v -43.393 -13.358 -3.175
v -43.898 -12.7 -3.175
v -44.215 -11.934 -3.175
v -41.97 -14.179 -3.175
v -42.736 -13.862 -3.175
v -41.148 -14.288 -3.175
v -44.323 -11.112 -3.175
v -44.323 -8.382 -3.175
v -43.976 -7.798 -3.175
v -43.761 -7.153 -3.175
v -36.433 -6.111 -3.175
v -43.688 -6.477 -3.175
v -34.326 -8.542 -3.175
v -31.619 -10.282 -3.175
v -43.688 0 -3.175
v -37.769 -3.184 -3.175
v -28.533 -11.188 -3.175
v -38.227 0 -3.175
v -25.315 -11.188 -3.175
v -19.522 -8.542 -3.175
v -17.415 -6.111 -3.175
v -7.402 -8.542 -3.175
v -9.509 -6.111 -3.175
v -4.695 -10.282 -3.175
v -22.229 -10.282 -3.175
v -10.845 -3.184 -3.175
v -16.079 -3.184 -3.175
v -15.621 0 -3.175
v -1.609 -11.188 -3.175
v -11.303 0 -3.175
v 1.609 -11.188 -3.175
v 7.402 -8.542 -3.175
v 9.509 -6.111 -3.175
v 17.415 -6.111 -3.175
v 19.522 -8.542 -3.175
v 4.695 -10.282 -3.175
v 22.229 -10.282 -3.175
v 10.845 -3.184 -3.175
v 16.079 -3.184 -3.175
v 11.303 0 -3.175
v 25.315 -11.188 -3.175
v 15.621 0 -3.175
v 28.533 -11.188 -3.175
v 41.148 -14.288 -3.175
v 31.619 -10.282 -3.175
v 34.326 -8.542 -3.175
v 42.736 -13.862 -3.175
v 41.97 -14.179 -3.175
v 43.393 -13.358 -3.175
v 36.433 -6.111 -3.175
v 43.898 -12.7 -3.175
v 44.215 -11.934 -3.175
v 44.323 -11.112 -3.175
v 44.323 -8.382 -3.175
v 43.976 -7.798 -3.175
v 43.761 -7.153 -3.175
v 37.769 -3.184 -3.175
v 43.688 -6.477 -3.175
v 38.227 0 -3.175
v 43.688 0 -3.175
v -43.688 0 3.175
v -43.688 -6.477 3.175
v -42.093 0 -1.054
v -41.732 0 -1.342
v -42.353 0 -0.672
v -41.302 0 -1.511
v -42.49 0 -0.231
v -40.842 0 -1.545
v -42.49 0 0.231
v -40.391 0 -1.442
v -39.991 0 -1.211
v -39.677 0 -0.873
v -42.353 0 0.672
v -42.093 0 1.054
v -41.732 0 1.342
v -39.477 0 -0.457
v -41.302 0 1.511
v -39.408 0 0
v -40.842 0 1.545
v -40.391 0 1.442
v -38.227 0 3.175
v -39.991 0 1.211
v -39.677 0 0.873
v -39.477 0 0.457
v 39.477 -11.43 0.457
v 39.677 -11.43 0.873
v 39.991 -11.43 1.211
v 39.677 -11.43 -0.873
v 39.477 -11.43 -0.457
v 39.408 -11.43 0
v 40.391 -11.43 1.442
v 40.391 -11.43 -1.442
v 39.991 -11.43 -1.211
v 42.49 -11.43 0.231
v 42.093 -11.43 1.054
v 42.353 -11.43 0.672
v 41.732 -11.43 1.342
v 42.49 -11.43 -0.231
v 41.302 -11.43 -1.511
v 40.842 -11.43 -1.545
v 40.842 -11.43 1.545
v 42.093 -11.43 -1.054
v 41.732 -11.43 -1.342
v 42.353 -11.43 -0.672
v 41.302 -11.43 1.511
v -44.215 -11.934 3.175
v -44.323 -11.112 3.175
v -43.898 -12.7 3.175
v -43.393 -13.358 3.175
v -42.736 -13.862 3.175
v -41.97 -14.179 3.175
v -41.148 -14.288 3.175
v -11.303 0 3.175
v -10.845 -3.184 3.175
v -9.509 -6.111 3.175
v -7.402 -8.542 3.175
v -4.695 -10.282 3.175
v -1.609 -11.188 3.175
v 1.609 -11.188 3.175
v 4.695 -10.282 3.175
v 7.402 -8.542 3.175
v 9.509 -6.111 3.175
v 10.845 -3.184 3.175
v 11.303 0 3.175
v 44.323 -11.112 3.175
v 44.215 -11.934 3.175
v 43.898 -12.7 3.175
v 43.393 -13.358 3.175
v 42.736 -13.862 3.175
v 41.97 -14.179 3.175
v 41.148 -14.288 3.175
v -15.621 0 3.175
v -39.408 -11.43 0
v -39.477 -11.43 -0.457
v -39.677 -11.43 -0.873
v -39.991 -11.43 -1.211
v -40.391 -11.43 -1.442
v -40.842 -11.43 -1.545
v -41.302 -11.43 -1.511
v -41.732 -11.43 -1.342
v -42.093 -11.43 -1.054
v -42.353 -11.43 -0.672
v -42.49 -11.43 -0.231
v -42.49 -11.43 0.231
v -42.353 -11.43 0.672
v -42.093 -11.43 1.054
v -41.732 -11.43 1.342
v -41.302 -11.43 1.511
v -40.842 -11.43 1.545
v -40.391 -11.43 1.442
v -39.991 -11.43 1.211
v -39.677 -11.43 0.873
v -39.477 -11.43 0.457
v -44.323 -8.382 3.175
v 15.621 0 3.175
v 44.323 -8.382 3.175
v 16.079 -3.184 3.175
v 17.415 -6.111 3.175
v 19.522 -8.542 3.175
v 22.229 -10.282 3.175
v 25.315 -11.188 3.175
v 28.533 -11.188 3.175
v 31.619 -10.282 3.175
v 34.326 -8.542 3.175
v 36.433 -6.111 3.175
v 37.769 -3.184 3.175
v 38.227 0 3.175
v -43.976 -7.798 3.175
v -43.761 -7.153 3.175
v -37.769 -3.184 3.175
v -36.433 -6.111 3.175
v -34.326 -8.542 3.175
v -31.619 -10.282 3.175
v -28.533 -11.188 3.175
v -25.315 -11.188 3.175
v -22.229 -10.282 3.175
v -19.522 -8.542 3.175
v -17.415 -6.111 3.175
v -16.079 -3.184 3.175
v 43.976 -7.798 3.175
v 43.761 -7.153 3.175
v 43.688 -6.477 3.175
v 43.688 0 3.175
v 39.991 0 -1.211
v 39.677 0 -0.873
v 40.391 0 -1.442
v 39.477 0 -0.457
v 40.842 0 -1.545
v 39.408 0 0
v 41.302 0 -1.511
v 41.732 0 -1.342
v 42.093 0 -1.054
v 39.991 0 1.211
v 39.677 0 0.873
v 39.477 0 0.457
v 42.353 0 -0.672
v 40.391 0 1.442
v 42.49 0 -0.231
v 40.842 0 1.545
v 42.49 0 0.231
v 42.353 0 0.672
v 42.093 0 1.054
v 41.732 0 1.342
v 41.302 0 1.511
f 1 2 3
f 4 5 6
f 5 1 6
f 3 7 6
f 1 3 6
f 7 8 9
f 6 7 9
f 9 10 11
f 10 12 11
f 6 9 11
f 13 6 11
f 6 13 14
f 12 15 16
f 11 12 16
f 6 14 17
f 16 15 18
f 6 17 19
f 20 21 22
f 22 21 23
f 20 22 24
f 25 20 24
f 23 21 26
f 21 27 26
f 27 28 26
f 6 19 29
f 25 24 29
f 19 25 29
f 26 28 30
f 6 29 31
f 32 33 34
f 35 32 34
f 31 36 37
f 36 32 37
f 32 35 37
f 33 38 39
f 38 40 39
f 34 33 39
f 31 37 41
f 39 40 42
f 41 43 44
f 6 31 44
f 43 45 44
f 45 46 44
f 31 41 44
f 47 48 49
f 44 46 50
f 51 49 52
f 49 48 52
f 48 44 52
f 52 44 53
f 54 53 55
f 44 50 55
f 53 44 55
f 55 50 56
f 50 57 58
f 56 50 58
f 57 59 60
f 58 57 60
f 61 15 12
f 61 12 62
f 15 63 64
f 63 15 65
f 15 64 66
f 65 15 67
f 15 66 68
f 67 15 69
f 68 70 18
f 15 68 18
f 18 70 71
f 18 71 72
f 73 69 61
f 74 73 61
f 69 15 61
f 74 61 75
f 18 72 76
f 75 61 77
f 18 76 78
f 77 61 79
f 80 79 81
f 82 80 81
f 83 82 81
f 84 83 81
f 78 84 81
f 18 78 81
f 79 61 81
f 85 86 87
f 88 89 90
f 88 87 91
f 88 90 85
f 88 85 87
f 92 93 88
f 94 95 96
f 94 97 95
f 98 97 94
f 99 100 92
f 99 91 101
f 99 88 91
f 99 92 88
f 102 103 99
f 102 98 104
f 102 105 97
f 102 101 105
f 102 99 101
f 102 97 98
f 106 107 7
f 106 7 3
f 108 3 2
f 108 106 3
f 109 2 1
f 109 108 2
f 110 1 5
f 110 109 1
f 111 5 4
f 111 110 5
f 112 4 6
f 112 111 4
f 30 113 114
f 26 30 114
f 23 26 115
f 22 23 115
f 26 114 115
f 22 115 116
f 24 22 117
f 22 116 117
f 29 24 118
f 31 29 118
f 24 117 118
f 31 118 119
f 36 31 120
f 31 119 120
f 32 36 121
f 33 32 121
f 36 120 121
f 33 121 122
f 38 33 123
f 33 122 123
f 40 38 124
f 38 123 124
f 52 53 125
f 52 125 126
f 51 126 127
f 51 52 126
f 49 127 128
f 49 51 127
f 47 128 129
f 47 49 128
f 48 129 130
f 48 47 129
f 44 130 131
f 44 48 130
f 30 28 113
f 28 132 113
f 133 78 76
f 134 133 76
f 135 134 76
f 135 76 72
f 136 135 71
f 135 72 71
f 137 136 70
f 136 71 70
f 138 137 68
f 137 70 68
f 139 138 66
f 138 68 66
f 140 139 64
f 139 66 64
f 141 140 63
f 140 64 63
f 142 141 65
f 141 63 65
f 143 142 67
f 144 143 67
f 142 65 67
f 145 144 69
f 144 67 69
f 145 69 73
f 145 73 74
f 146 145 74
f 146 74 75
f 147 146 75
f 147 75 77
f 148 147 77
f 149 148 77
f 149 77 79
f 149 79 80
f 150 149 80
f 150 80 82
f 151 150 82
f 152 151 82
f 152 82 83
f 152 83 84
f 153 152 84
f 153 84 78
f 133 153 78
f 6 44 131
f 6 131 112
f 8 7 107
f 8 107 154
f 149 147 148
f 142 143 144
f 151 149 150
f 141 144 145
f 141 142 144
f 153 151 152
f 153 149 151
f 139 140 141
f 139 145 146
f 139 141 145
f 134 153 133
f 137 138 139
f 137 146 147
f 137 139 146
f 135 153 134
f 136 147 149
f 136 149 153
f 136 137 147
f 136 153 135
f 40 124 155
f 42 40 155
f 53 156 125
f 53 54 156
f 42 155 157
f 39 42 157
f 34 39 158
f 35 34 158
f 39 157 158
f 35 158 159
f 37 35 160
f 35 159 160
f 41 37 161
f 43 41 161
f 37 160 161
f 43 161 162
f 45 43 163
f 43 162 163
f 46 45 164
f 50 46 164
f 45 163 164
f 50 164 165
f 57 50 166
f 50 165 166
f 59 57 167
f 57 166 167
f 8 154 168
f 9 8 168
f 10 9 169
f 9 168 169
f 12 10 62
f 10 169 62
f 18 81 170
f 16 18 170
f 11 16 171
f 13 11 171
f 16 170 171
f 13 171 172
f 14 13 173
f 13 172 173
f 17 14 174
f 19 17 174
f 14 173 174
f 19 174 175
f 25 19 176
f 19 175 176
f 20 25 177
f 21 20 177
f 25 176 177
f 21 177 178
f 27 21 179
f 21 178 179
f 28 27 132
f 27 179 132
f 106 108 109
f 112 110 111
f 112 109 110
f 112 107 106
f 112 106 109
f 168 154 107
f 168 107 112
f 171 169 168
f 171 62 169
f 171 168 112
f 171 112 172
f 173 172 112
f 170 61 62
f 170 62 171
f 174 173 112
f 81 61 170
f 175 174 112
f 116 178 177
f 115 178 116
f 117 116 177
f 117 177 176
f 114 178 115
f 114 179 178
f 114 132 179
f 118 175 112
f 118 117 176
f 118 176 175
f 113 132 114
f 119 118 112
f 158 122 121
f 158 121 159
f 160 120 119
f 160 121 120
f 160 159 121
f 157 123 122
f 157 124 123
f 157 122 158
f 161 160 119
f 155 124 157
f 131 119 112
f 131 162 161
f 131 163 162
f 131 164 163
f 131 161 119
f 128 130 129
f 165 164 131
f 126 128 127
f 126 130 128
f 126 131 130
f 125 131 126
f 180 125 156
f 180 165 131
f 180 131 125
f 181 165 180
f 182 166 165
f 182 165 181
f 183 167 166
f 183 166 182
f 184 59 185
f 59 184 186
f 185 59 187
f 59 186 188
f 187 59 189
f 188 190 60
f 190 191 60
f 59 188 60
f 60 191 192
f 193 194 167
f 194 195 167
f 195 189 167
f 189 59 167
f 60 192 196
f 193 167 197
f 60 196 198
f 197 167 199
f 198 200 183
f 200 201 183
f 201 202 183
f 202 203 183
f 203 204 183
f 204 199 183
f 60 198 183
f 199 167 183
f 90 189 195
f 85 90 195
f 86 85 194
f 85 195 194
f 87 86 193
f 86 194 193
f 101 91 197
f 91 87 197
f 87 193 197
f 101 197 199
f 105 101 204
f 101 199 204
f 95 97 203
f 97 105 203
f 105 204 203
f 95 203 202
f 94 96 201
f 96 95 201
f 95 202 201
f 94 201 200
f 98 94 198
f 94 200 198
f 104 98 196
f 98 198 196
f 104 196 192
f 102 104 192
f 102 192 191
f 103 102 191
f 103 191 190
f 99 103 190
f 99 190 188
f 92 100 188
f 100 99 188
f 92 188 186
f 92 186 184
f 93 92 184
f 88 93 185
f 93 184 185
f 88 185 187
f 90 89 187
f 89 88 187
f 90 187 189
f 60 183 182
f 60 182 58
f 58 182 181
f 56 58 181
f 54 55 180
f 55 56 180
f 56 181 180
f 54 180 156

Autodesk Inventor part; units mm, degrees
ref_plane "YZ Plane" through (0, 0, 0) normal (1, 0, 0) x (0, 1, 0)
ref_plane "XZ Plane" through (0, 0, 0) normal (0, 1, 0) x (-1, 0, 0)
ref_plane "XY Plane" through (0, 0, 0) normal (0, 0, 1) x (1, 0, 0)
sketch "Sketch1" plane through (0, 0, 0) normal (0, 0, 1) x (1, 0, 0)
  line L0 (-44.323, 14.2875) -> (44.323, 14.2875)
  line L1 (44.323, 14.2875) -> (44.323, -14.2875)
  line L2 (44.323, -14.2875) -> (-44.323, -14.2875)
  line L3 (-44.323, -14.2875) -> (-44.323, 14.2875)
  point P0 (0, 0)
  dimension "d0" = 88.646
  dimension "d1" = 44.323
  dimension "d2" = 14.2875
  dimension "d3" = 28.575
extrude "Extrusion1" add sketch "Sketch1" along normal mid plane 6.35
sketch "Sketch2" plane through (0, 0, 3.175) normal (0, 0, 1) x (1, 0, 0)
  circle A0 centre (-26.924, 0) radius 11.303
  circle A1 centre (0, 0) radius 11.303
  line L0 (44.323, -14.2875) -> (44.323, 14.2875) projected
  circle A2 centre (26.924, 0) radius 11.303
  line L1 (-44.323, 14.2875) -> (-44.323, -14.2875) projected
  line L2 (-44.323, 0) -> (44.323, 0) construction
  line L3 (44.323, 14.2875) -> (-44.323, 14.2875) projected
  point P0 (0, 0)
  dimension "d6" = 22.606
  dimension "d9" = 22.606
  dimension "d11" = 22.606
  dimension "d14" = 26.924
  dimension "d21" = 88.646
  dimension "d22" = 26.924
  dimension "d50" = 0
sketch "Sketch4" plane through (-44.323, -14.2875, -3.175) normal (-1, 0, 0) x (0, 0, 1)
  line L0 (0, 0) -> (0, 28.575) projected
  line L1 (6.35, 28.575) -> (6.35, 0) projected
  line L2 (0, 22.6695) -> (6.35, 22.6695)
  line L3 (6.35, 22.6695) -> (6.35, 5.9055)
  line L4 (6.35, 5.9055) -> (0, 5.9055)
  line L5 (0, 5.9055) -> (0, 22.6695)
  point P0 (3.175, 14.2875)
  dimension "d30" = 8.382
  dimension "d31" = 16.764
extrude "Extrusion3" cut sketch "Sketch4" against normal blind 0.635
mirror "Mirror1" about plane through (0, 0, 0) normal (1, 0, 0) of "Extrusion3"
sketch "Sketch7" plane through (-44.323, -14.2875, 3.175) normal (0, -1, 0) x (1, 0, 0)
  line L0 (30.353, -14.605) -> (58.293, -14.605)
  line L1 (58.293, -14.605) -> (58.293, 8.255)
  line L2 (58.293, 8.255) -> (30.353, 8.255)
  line L3 (30.353, 8.255) -> (30.353, -14.605)
  point P0 (44.323, -3.175)
  dimension "d39" = 27.94
  dimension "d40" = 22.86
  dimension "d41" = 11.43
  dimension "d42" = 13.97
extrude "Extrusion5" [suppressed]
sketch "Sketch8" plane through (0, 0, -3.175) normal (0, 0, -1) x (-1, 0, 0)
  line L0 (-44.323, 14.2875) -> (44.323, 14.2875) projected
  line L1 (15.6718, 14.2875) -> (-15.6718, 14.2875)
  line L2 (-15.6718, 14.2875) -> (-15.6718, 52.3875)
  line L3 (-15.6718, 52.3875) -> (15.6718, 52.3875)
  line L4 (15.6718, 52.3875) -> (15.6718, 14.2875)
  point P0 (0, 0)
  dimension "d45" = 31.3436
  dimension "d46" = 38.1
  dimension "d47" = 15.6718
extrude "Extrusion6" add sketch "Sketch8" against normal up to surface (6.35 mm away)
extrude "Extrusion7" cut sketch "Sketch2" against normal blind 25.4
sketch "Sketch9" plane through (-15.6718, 52.3875, -3.175) normal (0, 1, 0) x (1, 0, 0)
  line L0 (-28.6512, -6.35) -> (59.9948, -6.35) projected
  line L1 (3.1718, -6.35) -> (28.1718, -6.35)
  line L2 (28.1718, -6.35) -> (28.1718, -3.175)
  line L3 (28.1718, -3.175) -> (3.1718, -3.175)
  line L4 (3.1718, -3.175) -> (3.1718, -6.35)
  point P0 (15.6718, -3.175)
  dimension "d64" = 3.175
  dimension "d65" = 25
  dimension "d66" = 12.5
extrude "Extrusion8" cut sketch "Sketch9" against normal blind 0.9
sketch "Sketch13" plane through (0, 0, 3.175) normal (0, 0, 1) x (1, 0, 0)
  line L0 (-15.6718, 52.3875) -> (-12.5, 52.3875) projected
  line L1 (-12.5, 52.3875) -> (12.5, 52.3875) projected
  line L2 (12.5, 52.3875) -> (15.6718, 52.3875) projected
  line L3 (15.6718, 52.3875) -> (15.6718, 14.2875) projected
  line L4 (-15.6718, 14.2875) -> (-15.6718, 52.3875) projected
  line L5 (-15.6718, 14.2875) -> (-44.323, 14.2875) projected
  line L6 (44.323, 14.2875) -> (15.6718, 14.2875) projected
  line L7 (44.323, 8.382) -> (44.323, 14.2875) projected
  line L8 (-44.323, 14.2875) -> (-44.323, 8.382) projected
  line L9 (-44.323, 8.382) -> (-43.688, 8.382) projected
  line L10 (43.688, 8.382) -> (44.323, 8.382) projected
  line L11 (-43.688, 8.382) -> (-43.688, 0)
  line L12 (-43.688, 8.382) -> (-43.688, -8.382) projected
  line L13 (-43.688, 0) -> (43.688, 0)
  line L14 (43.688, 8.382) -> (43.688, -8.382) projected
  line L15 (43.688, 0) -> (43.688, 8.382)
  point P0 (0, 0)
extrude "Extrusion11" cut sketch "Sketch13" against normal through all
sketch "Sketch14" plane through (-43.688, 0, 3.175) normal (0, 1, 0) x (1, 0, 0)
  line L0 (5.461, 6.35) -> (5.461, 0) projected
  line L1 (0, 6.35) -> (5.461, 6.35) projected
  line L2 (0, 0) -> (0, 6.35) projected
  line L3 (5.461, 0) -> (0, 0) projected
  circle A0 centre (2.7305, 3.175) radius 1.5494
  point P0 (43.688, 3.175)
  dimension "d84" = 3.0988
  dimension "d85" = 5.461
  dimension "d87" = 3.175
  dimension "d88" = 2.7305
  dimension "d98" = 6.35
extrude "Extrusion12" cut sketch "Sketch14" against normal blind 11.43 contours A0
mirror "Mirror3" about plane through (0, 0, 0) normal (1, 0, 0) of "Extrusion12"
thread "Thread3" size "5-40 UNC" class "2B" standard "ANSI Unified Screw Threads" full length
thread "Thread4" size "5-40 UNC" class "2B" standard "ANSI Unified Screw Threads" full length
fillet "Fillet1" radius 3.175 2 edges at (44.323, -14.2875, 0) (-44.323, -14.2875, 0)
fillet "Fillet3" radius 3.175 2 edges at (-43.688, -8.382, 0) (43.688, -8.382, 0)
equation "\"d1\" = 0.5 * d0"
equation "\"d2\" = 0.5 * d3"
equation "\"d9\" = d7"
equation "\"d11\" = d9"
equation "\"d22\" = d14"
equation "\"d30\" = 0.5 * d31"
equation "\"d41\" = 0.5 * d40"
equation "\"d42\" = 0.5 * d39"
equation "\"d47\" = 0.5 * d45"
equation "\"d66\" = 0.5 * d65"
equation "\"d87\" = 0.5 * d98"
equation "\"d88\" = 0.5 * d85"
equation "\"d7\" = d6"
properties part number "Tube Holder Halve 3" material "Aluminum 6061-AHC"
